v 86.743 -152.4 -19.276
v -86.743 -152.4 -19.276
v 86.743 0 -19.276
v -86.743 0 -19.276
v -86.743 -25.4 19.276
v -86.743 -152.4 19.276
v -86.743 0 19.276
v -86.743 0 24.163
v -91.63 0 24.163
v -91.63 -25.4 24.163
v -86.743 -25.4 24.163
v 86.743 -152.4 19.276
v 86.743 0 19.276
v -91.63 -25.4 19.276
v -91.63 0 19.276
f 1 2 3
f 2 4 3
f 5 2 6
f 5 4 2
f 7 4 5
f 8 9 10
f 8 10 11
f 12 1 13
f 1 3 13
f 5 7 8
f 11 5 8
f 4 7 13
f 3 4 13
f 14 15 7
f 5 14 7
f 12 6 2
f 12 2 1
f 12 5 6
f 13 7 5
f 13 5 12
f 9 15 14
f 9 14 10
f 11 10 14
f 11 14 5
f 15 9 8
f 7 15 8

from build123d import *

# Parameters (mm, degrees)
F0_W     = 4.8869550228
F0_H     = 4.8869550228
F1_DEPTH = 25.4
F0_W_2   = 173.4868139029
F0_H_2   = 38.5526269674
F2_DEPTH = 127


with BuildPart() as f1:
    # F0 (on Front) → F1 (new body)
    with BuildSketch(Plane.XZ):
        with Locations((-89.1868844628, 21.7197909951)):
            Rectangle(F0_W, F0_H)
    extrude(amount=F1_DEPTH)



with BuildPart() as f1b:
    # F0 (on Front) → F1, piece 2 (new body)
    with BuildSketch(Plane.XZ):
        Rectangle(F0_W_2, F0_H_2)
    extrude(amount=F1_DEPTH)


with BuildPart() as f1_1:
    add(f1.part)
    # F2 (add): a face of the model
    f2_faces = [f1b.part.faces().sort_by_distance(p)[0] for p in [
        (0, -25.4, 0),
    ]]

    add(f1b.part)  # F2 merges F1b
    extrude(f2_faces, amount=F2_DEPTH)


solid = f1_1.part
